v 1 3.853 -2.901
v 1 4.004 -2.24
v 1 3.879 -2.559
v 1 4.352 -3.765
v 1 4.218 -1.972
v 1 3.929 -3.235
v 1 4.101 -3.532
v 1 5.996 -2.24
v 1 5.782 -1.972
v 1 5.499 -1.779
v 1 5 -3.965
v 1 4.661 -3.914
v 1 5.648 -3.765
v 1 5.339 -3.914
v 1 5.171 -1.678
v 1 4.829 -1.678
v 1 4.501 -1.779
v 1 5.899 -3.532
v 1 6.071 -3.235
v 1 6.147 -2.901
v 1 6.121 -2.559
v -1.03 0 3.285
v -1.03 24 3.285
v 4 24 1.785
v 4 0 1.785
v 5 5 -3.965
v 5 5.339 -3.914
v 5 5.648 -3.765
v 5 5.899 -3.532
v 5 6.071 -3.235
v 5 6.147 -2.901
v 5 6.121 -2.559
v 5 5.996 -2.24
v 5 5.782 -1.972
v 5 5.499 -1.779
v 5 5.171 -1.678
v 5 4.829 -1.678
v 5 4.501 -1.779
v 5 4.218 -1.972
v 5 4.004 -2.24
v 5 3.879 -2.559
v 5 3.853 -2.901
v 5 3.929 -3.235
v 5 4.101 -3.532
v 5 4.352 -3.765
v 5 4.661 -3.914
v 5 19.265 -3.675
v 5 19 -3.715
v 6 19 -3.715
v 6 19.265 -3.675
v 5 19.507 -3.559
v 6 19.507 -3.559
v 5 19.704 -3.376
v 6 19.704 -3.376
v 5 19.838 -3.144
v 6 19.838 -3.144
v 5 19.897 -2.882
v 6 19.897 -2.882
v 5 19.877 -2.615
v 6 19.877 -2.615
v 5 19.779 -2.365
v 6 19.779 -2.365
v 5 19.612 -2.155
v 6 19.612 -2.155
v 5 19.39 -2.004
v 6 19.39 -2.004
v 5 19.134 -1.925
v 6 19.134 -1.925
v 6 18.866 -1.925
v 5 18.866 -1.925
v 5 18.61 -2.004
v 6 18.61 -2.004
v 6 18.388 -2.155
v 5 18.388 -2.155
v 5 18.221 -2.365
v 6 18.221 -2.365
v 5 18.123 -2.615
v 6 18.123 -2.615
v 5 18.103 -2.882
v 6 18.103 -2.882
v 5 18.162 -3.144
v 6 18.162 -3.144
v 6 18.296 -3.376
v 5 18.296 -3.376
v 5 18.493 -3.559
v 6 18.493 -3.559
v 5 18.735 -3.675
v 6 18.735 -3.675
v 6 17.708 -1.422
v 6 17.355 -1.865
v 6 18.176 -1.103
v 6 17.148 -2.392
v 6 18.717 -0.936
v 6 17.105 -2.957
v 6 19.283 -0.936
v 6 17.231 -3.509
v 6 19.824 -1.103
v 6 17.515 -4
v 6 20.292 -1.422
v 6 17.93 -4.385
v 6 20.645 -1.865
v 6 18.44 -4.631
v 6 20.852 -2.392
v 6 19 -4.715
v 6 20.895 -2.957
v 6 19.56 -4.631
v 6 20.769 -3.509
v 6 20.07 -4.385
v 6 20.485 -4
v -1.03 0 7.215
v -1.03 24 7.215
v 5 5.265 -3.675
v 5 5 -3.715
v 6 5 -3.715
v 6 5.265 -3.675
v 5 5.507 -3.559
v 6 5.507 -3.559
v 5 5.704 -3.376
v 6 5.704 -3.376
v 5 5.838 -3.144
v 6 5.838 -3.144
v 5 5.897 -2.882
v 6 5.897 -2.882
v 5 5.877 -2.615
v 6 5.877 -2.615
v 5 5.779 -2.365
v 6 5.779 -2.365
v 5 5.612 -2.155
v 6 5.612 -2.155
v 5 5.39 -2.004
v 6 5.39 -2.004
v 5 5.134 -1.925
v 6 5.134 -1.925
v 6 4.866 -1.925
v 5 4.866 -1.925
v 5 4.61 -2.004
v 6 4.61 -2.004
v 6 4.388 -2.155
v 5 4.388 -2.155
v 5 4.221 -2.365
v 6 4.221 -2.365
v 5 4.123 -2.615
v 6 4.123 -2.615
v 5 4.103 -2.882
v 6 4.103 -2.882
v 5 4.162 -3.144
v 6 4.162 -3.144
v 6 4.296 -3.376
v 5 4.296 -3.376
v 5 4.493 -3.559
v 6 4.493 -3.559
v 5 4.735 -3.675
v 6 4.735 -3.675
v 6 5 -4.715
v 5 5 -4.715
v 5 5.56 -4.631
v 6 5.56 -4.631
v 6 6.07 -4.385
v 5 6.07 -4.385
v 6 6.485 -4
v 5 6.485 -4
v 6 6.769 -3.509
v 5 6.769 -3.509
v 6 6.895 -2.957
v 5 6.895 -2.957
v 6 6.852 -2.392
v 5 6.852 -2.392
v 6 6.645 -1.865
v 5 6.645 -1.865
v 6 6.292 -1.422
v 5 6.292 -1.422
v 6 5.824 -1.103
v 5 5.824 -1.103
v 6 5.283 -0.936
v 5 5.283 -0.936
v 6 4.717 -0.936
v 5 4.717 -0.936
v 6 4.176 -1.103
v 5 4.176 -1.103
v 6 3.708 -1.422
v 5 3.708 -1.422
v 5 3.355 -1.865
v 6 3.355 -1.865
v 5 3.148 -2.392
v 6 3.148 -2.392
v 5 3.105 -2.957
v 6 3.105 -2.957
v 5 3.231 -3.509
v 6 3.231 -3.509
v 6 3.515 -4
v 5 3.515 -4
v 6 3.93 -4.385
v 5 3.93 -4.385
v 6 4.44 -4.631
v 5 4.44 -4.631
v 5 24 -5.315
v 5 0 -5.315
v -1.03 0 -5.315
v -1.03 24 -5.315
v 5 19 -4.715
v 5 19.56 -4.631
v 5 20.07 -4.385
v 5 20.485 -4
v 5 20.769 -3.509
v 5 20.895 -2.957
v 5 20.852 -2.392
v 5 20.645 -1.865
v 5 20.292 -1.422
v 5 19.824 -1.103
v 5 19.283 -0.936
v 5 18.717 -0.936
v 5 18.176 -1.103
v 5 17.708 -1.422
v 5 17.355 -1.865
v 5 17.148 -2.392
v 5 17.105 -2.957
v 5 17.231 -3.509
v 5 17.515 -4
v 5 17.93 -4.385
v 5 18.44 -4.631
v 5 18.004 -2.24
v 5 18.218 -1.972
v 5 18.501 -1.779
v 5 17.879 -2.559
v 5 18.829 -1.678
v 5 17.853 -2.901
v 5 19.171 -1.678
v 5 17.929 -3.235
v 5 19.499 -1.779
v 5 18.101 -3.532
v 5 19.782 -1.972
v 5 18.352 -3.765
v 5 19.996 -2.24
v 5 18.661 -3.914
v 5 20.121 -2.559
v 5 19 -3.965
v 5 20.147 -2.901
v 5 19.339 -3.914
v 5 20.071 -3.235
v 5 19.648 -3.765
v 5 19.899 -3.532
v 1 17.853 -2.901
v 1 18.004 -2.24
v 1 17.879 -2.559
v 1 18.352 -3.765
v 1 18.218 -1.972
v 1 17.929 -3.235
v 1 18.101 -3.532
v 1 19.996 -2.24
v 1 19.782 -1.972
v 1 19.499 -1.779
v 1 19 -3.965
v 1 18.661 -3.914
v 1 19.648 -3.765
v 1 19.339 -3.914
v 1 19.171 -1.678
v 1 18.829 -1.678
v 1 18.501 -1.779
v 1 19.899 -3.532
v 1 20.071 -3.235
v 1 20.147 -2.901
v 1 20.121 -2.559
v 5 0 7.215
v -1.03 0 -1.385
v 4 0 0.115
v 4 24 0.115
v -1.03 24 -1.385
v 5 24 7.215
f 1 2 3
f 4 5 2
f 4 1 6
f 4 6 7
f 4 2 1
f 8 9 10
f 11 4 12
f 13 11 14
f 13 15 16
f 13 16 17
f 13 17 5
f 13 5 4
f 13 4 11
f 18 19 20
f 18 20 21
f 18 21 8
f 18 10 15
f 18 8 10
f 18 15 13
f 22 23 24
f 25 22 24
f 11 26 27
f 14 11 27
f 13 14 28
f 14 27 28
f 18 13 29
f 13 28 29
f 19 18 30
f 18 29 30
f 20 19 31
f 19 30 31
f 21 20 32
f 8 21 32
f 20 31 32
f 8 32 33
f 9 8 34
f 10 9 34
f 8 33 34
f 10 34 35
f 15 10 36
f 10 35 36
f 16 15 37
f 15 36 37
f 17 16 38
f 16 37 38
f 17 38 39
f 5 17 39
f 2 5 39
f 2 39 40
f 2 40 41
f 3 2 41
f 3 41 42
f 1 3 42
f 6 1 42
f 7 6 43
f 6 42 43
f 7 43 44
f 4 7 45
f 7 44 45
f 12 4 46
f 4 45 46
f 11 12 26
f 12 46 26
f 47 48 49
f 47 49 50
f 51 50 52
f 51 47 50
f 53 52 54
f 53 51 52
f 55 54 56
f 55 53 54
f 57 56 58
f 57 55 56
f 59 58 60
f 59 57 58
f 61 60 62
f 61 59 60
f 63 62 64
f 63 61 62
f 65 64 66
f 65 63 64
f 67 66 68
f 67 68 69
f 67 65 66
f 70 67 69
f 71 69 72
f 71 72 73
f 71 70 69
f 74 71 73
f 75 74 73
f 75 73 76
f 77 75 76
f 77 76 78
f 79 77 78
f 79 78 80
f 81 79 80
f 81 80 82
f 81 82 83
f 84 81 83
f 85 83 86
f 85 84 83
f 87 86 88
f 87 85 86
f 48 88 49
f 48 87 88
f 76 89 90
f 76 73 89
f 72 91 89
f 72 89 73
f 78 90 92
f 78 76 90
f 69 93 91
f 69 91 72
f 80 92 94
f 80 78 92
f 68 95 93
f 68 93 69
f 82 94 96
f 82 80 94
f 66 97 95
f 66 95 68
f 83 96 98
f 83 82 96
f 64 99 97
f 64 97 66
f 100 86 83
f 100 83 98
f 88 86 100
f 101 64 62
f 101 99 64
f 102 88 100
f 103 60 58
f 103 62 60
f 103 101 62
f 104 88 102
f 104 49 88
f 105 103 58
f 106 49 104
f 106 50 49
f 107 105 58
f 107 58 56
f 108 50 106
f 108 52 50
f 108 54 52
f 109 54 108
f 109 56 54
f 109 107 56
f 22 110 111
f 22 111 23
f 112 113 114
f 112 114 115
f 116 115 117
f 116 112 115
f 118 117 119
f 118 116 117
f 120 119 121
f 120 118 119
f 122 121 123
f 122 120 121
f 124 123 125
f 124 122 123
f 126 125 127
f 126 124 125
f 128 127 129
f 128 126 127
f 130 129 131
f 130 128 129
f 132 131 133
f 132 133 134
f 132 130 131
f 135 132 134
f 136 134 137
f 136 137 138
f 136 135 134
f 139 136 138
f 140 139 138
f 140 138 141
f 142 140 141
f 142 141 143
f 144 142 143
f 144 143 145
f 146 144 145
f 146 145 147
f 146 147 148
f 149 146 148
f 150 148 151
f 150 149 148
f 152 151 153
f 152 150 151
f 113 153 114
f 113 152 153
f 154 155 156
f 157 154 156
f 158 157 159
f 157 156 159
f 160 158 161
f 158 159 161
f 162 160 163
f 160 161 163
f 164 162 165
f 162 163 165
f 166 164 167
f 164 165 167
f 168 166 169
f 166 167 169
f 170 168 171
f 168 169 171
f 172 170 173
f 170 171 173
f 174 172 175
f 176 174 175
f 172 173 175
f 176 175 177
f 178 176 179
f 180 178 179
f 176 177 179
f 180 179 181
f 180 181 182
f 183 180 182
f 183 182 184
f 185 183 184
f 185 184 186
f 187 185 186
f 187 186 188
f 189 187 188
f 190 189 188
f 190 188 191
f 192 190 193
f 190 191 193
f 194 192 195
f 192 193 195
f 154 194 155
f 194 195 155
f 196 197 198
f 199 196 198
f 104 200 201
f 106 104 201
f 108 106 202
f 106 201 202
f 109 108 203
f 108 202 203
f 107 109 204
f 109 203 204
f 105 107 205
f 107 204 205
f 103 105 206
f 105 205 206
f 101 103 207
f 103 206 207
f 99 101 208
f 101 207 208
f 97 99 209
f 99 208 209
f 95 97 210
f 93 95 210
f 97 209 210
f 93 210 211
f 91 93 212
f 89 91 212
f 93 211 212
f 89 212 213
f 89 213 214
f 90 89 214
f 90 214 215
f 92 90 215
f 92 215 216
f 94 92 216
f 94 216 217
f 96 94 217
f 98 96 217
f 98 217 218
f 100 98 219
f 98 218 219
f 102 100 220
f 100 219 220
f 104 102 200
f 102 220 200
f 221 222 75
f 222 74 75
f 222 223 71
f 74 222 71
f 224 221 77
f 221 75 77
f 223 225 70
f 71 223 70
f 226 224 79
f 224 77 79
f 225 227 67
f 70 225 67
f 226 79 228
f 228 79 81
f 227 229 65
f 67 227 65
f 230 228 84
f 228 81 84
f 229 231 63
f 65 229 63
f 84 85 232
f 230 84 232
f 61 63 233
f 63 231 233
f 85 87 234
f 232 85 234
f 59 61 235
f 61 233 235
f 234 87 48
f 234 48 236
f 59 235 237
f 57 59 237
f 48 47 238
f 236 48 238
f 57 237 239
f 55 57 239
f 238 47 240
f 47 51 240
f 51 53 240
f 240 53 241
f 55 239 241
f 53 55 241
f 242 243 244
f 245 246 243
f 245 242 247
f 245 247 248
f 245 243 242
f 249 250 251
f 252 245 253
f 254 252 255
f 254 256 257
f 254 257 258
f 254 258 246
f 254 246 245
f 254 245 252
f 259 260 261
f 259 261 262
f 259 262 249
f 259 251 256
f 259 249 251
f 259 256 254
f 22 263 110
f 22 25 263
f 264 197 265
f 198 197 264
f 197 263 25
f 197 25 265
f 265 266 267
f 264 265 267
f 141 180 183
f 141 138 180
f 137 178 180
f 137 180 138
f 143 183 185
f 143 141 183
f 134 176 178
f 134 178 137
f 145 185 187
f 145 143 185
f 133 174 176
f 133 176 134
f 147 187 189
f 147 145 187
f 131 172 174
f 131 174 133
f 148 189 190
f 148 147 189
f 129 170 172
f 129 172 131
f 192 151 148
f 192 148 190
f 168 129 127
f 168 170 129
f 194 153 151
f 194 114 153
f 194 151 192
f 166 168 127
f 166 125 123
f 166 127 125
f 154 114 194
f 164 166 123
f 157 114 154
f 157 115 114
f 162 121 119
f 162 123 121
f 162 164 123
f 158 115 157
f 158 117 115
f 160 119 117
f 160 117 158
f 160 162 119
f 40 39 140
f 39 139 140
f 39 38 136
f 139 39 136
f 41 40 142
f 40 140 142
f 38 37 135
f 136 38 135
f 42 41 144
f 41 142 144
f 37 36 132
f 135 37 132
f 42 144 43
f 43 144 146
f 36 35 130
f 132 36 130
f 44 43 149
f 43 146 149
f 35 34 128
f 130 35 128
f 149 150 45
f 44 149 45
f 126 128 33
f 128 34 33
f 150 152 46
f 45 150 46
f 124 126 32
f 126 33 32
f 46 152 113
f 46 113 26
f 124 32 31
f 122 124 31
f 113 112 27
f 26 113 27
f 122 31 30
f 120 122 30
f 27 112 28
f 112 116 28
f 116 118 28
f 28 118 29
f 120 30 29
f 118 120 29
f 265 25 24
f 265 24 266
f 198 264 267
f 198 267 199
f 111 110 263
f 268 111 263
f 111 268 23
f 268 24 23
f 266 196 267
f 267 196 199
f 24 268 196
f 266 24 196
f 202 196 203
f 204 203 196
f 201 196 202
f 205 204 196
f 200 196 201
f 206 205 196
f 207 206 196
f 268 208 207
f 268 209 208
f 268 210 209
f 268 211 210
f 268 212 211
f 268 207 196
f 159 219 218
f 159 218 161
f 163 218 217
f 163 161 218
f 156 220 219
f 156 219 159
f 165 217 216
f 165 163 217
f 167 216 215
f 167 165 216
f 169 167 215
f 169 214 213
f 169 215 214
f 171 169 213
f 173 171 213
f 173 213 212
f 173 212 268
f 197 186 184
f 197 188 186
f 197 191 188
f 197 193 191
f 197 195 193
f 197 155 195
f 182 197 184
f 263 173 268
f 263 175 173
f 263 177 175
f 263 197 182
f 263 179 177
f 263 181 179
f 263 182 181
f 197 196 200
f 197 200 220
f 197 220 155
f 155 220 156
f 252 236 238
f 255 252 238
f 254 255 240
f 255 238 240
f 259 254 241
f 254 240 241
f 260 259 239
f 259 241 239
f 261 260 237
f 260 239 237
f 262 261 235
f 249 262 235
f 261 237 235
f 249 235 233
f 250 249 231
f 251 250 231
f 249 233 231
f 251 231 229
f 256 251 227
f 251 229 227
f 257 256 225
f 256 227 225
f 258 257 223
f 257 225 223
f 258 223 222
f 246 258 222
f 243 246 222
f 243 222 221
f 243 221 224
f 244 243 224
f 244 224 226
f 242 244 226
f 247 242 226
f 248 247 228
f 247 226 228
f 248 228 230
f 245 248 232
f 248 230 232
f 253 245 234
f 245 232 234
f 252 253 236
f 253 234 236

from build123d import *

# Parameters (mm, degrees)
BOSS_EXTRUDE1_DEPTH = 24
SKETCH3_R           = 1.9
SKETCH3_R_2         = 0.9
BOSS_EXTRUDE2_DEPTH = 1
SKETCH4_R           = 1.15
CUT_EXTRUDE2_DEPTH  = 4
CUT_EXTRUDE3_DEPTH  = 30


with BuildPart() as part:
    # Sketch1 → Boss-Extrude1 (new body)
    with BuildSketch(Plane(origin=(0, 0, 0), x_dir=(1, 0, 0), z_dir=(0, 1, 0))):
        Polygon((0.758759529, 5.315), (5, 5.315), (5, -7.215), (1.398203198, -7.215), (-1.03, -7.215), (-1.03, -1.785), (4, -1.785), (4, -0.115), (-1.03, -0.115), (-1.03, 5.315), align=None)
    extrude(amount=BOSS_EXTRUDE1_DEPTH)

    # Sketch3 → Boss-Extrude2 (add)
    with BuildSketch(Plane(origin=(5, 0, 0), x_dir=(0, 0, -1), z_dir=(1, 0, 0))):
        with Locations((2.815, 19)):
            Circle(SKETCH3_R)
        with Locations((2.815, 19)):
            Circle(SKETCH3_R_2, mode=Mode.SUBTRACT)
        with Locations((2.815, 5)):
            Circle(SKETCH3_R)
        with Locations((2.815, 5)):
            Circle(SKETCH3_R_2, mode=Mode.SUBTRACT)
    extrude(amount=BOSS_EXTRUDE2_DEPTH)

    # Sketch4 → Cut-Extrude2 (cut)
    with BuildSketch(Plane(origin=(5, 0, 0), x_dir=(0, 0, -1), z_dir=(1, 0, 0))):
        with Locations((2.815, 19)):
            Circle(SKETCH4_R)
        with Locations((2.815, 5)):
            Circle(SKETCH4_R)
    extrude(amount=-CUT_EXTRUDE2_DEPTH, mode=Mode.SUBTRACT)

    # Sketch6 → Cut-Extrude3 (cut)
    with BuildSketch(Plane(origin=(0, 24, 0), x_dir=(1, 0, 0), z_dir=(0, 1, 0))):
        Polygon((-1.03, -0.115), (4, -0.115), (-1.03, 1.385), align=None)
        Polygon((4, -1.785), (-1.03, -1.785), (-1.03, -3.285), align=None)
    extrude(amount=-CUT_EXTRUDE3_DEPTH, mode=Mode.SUBTRACT)


solid = part.part
